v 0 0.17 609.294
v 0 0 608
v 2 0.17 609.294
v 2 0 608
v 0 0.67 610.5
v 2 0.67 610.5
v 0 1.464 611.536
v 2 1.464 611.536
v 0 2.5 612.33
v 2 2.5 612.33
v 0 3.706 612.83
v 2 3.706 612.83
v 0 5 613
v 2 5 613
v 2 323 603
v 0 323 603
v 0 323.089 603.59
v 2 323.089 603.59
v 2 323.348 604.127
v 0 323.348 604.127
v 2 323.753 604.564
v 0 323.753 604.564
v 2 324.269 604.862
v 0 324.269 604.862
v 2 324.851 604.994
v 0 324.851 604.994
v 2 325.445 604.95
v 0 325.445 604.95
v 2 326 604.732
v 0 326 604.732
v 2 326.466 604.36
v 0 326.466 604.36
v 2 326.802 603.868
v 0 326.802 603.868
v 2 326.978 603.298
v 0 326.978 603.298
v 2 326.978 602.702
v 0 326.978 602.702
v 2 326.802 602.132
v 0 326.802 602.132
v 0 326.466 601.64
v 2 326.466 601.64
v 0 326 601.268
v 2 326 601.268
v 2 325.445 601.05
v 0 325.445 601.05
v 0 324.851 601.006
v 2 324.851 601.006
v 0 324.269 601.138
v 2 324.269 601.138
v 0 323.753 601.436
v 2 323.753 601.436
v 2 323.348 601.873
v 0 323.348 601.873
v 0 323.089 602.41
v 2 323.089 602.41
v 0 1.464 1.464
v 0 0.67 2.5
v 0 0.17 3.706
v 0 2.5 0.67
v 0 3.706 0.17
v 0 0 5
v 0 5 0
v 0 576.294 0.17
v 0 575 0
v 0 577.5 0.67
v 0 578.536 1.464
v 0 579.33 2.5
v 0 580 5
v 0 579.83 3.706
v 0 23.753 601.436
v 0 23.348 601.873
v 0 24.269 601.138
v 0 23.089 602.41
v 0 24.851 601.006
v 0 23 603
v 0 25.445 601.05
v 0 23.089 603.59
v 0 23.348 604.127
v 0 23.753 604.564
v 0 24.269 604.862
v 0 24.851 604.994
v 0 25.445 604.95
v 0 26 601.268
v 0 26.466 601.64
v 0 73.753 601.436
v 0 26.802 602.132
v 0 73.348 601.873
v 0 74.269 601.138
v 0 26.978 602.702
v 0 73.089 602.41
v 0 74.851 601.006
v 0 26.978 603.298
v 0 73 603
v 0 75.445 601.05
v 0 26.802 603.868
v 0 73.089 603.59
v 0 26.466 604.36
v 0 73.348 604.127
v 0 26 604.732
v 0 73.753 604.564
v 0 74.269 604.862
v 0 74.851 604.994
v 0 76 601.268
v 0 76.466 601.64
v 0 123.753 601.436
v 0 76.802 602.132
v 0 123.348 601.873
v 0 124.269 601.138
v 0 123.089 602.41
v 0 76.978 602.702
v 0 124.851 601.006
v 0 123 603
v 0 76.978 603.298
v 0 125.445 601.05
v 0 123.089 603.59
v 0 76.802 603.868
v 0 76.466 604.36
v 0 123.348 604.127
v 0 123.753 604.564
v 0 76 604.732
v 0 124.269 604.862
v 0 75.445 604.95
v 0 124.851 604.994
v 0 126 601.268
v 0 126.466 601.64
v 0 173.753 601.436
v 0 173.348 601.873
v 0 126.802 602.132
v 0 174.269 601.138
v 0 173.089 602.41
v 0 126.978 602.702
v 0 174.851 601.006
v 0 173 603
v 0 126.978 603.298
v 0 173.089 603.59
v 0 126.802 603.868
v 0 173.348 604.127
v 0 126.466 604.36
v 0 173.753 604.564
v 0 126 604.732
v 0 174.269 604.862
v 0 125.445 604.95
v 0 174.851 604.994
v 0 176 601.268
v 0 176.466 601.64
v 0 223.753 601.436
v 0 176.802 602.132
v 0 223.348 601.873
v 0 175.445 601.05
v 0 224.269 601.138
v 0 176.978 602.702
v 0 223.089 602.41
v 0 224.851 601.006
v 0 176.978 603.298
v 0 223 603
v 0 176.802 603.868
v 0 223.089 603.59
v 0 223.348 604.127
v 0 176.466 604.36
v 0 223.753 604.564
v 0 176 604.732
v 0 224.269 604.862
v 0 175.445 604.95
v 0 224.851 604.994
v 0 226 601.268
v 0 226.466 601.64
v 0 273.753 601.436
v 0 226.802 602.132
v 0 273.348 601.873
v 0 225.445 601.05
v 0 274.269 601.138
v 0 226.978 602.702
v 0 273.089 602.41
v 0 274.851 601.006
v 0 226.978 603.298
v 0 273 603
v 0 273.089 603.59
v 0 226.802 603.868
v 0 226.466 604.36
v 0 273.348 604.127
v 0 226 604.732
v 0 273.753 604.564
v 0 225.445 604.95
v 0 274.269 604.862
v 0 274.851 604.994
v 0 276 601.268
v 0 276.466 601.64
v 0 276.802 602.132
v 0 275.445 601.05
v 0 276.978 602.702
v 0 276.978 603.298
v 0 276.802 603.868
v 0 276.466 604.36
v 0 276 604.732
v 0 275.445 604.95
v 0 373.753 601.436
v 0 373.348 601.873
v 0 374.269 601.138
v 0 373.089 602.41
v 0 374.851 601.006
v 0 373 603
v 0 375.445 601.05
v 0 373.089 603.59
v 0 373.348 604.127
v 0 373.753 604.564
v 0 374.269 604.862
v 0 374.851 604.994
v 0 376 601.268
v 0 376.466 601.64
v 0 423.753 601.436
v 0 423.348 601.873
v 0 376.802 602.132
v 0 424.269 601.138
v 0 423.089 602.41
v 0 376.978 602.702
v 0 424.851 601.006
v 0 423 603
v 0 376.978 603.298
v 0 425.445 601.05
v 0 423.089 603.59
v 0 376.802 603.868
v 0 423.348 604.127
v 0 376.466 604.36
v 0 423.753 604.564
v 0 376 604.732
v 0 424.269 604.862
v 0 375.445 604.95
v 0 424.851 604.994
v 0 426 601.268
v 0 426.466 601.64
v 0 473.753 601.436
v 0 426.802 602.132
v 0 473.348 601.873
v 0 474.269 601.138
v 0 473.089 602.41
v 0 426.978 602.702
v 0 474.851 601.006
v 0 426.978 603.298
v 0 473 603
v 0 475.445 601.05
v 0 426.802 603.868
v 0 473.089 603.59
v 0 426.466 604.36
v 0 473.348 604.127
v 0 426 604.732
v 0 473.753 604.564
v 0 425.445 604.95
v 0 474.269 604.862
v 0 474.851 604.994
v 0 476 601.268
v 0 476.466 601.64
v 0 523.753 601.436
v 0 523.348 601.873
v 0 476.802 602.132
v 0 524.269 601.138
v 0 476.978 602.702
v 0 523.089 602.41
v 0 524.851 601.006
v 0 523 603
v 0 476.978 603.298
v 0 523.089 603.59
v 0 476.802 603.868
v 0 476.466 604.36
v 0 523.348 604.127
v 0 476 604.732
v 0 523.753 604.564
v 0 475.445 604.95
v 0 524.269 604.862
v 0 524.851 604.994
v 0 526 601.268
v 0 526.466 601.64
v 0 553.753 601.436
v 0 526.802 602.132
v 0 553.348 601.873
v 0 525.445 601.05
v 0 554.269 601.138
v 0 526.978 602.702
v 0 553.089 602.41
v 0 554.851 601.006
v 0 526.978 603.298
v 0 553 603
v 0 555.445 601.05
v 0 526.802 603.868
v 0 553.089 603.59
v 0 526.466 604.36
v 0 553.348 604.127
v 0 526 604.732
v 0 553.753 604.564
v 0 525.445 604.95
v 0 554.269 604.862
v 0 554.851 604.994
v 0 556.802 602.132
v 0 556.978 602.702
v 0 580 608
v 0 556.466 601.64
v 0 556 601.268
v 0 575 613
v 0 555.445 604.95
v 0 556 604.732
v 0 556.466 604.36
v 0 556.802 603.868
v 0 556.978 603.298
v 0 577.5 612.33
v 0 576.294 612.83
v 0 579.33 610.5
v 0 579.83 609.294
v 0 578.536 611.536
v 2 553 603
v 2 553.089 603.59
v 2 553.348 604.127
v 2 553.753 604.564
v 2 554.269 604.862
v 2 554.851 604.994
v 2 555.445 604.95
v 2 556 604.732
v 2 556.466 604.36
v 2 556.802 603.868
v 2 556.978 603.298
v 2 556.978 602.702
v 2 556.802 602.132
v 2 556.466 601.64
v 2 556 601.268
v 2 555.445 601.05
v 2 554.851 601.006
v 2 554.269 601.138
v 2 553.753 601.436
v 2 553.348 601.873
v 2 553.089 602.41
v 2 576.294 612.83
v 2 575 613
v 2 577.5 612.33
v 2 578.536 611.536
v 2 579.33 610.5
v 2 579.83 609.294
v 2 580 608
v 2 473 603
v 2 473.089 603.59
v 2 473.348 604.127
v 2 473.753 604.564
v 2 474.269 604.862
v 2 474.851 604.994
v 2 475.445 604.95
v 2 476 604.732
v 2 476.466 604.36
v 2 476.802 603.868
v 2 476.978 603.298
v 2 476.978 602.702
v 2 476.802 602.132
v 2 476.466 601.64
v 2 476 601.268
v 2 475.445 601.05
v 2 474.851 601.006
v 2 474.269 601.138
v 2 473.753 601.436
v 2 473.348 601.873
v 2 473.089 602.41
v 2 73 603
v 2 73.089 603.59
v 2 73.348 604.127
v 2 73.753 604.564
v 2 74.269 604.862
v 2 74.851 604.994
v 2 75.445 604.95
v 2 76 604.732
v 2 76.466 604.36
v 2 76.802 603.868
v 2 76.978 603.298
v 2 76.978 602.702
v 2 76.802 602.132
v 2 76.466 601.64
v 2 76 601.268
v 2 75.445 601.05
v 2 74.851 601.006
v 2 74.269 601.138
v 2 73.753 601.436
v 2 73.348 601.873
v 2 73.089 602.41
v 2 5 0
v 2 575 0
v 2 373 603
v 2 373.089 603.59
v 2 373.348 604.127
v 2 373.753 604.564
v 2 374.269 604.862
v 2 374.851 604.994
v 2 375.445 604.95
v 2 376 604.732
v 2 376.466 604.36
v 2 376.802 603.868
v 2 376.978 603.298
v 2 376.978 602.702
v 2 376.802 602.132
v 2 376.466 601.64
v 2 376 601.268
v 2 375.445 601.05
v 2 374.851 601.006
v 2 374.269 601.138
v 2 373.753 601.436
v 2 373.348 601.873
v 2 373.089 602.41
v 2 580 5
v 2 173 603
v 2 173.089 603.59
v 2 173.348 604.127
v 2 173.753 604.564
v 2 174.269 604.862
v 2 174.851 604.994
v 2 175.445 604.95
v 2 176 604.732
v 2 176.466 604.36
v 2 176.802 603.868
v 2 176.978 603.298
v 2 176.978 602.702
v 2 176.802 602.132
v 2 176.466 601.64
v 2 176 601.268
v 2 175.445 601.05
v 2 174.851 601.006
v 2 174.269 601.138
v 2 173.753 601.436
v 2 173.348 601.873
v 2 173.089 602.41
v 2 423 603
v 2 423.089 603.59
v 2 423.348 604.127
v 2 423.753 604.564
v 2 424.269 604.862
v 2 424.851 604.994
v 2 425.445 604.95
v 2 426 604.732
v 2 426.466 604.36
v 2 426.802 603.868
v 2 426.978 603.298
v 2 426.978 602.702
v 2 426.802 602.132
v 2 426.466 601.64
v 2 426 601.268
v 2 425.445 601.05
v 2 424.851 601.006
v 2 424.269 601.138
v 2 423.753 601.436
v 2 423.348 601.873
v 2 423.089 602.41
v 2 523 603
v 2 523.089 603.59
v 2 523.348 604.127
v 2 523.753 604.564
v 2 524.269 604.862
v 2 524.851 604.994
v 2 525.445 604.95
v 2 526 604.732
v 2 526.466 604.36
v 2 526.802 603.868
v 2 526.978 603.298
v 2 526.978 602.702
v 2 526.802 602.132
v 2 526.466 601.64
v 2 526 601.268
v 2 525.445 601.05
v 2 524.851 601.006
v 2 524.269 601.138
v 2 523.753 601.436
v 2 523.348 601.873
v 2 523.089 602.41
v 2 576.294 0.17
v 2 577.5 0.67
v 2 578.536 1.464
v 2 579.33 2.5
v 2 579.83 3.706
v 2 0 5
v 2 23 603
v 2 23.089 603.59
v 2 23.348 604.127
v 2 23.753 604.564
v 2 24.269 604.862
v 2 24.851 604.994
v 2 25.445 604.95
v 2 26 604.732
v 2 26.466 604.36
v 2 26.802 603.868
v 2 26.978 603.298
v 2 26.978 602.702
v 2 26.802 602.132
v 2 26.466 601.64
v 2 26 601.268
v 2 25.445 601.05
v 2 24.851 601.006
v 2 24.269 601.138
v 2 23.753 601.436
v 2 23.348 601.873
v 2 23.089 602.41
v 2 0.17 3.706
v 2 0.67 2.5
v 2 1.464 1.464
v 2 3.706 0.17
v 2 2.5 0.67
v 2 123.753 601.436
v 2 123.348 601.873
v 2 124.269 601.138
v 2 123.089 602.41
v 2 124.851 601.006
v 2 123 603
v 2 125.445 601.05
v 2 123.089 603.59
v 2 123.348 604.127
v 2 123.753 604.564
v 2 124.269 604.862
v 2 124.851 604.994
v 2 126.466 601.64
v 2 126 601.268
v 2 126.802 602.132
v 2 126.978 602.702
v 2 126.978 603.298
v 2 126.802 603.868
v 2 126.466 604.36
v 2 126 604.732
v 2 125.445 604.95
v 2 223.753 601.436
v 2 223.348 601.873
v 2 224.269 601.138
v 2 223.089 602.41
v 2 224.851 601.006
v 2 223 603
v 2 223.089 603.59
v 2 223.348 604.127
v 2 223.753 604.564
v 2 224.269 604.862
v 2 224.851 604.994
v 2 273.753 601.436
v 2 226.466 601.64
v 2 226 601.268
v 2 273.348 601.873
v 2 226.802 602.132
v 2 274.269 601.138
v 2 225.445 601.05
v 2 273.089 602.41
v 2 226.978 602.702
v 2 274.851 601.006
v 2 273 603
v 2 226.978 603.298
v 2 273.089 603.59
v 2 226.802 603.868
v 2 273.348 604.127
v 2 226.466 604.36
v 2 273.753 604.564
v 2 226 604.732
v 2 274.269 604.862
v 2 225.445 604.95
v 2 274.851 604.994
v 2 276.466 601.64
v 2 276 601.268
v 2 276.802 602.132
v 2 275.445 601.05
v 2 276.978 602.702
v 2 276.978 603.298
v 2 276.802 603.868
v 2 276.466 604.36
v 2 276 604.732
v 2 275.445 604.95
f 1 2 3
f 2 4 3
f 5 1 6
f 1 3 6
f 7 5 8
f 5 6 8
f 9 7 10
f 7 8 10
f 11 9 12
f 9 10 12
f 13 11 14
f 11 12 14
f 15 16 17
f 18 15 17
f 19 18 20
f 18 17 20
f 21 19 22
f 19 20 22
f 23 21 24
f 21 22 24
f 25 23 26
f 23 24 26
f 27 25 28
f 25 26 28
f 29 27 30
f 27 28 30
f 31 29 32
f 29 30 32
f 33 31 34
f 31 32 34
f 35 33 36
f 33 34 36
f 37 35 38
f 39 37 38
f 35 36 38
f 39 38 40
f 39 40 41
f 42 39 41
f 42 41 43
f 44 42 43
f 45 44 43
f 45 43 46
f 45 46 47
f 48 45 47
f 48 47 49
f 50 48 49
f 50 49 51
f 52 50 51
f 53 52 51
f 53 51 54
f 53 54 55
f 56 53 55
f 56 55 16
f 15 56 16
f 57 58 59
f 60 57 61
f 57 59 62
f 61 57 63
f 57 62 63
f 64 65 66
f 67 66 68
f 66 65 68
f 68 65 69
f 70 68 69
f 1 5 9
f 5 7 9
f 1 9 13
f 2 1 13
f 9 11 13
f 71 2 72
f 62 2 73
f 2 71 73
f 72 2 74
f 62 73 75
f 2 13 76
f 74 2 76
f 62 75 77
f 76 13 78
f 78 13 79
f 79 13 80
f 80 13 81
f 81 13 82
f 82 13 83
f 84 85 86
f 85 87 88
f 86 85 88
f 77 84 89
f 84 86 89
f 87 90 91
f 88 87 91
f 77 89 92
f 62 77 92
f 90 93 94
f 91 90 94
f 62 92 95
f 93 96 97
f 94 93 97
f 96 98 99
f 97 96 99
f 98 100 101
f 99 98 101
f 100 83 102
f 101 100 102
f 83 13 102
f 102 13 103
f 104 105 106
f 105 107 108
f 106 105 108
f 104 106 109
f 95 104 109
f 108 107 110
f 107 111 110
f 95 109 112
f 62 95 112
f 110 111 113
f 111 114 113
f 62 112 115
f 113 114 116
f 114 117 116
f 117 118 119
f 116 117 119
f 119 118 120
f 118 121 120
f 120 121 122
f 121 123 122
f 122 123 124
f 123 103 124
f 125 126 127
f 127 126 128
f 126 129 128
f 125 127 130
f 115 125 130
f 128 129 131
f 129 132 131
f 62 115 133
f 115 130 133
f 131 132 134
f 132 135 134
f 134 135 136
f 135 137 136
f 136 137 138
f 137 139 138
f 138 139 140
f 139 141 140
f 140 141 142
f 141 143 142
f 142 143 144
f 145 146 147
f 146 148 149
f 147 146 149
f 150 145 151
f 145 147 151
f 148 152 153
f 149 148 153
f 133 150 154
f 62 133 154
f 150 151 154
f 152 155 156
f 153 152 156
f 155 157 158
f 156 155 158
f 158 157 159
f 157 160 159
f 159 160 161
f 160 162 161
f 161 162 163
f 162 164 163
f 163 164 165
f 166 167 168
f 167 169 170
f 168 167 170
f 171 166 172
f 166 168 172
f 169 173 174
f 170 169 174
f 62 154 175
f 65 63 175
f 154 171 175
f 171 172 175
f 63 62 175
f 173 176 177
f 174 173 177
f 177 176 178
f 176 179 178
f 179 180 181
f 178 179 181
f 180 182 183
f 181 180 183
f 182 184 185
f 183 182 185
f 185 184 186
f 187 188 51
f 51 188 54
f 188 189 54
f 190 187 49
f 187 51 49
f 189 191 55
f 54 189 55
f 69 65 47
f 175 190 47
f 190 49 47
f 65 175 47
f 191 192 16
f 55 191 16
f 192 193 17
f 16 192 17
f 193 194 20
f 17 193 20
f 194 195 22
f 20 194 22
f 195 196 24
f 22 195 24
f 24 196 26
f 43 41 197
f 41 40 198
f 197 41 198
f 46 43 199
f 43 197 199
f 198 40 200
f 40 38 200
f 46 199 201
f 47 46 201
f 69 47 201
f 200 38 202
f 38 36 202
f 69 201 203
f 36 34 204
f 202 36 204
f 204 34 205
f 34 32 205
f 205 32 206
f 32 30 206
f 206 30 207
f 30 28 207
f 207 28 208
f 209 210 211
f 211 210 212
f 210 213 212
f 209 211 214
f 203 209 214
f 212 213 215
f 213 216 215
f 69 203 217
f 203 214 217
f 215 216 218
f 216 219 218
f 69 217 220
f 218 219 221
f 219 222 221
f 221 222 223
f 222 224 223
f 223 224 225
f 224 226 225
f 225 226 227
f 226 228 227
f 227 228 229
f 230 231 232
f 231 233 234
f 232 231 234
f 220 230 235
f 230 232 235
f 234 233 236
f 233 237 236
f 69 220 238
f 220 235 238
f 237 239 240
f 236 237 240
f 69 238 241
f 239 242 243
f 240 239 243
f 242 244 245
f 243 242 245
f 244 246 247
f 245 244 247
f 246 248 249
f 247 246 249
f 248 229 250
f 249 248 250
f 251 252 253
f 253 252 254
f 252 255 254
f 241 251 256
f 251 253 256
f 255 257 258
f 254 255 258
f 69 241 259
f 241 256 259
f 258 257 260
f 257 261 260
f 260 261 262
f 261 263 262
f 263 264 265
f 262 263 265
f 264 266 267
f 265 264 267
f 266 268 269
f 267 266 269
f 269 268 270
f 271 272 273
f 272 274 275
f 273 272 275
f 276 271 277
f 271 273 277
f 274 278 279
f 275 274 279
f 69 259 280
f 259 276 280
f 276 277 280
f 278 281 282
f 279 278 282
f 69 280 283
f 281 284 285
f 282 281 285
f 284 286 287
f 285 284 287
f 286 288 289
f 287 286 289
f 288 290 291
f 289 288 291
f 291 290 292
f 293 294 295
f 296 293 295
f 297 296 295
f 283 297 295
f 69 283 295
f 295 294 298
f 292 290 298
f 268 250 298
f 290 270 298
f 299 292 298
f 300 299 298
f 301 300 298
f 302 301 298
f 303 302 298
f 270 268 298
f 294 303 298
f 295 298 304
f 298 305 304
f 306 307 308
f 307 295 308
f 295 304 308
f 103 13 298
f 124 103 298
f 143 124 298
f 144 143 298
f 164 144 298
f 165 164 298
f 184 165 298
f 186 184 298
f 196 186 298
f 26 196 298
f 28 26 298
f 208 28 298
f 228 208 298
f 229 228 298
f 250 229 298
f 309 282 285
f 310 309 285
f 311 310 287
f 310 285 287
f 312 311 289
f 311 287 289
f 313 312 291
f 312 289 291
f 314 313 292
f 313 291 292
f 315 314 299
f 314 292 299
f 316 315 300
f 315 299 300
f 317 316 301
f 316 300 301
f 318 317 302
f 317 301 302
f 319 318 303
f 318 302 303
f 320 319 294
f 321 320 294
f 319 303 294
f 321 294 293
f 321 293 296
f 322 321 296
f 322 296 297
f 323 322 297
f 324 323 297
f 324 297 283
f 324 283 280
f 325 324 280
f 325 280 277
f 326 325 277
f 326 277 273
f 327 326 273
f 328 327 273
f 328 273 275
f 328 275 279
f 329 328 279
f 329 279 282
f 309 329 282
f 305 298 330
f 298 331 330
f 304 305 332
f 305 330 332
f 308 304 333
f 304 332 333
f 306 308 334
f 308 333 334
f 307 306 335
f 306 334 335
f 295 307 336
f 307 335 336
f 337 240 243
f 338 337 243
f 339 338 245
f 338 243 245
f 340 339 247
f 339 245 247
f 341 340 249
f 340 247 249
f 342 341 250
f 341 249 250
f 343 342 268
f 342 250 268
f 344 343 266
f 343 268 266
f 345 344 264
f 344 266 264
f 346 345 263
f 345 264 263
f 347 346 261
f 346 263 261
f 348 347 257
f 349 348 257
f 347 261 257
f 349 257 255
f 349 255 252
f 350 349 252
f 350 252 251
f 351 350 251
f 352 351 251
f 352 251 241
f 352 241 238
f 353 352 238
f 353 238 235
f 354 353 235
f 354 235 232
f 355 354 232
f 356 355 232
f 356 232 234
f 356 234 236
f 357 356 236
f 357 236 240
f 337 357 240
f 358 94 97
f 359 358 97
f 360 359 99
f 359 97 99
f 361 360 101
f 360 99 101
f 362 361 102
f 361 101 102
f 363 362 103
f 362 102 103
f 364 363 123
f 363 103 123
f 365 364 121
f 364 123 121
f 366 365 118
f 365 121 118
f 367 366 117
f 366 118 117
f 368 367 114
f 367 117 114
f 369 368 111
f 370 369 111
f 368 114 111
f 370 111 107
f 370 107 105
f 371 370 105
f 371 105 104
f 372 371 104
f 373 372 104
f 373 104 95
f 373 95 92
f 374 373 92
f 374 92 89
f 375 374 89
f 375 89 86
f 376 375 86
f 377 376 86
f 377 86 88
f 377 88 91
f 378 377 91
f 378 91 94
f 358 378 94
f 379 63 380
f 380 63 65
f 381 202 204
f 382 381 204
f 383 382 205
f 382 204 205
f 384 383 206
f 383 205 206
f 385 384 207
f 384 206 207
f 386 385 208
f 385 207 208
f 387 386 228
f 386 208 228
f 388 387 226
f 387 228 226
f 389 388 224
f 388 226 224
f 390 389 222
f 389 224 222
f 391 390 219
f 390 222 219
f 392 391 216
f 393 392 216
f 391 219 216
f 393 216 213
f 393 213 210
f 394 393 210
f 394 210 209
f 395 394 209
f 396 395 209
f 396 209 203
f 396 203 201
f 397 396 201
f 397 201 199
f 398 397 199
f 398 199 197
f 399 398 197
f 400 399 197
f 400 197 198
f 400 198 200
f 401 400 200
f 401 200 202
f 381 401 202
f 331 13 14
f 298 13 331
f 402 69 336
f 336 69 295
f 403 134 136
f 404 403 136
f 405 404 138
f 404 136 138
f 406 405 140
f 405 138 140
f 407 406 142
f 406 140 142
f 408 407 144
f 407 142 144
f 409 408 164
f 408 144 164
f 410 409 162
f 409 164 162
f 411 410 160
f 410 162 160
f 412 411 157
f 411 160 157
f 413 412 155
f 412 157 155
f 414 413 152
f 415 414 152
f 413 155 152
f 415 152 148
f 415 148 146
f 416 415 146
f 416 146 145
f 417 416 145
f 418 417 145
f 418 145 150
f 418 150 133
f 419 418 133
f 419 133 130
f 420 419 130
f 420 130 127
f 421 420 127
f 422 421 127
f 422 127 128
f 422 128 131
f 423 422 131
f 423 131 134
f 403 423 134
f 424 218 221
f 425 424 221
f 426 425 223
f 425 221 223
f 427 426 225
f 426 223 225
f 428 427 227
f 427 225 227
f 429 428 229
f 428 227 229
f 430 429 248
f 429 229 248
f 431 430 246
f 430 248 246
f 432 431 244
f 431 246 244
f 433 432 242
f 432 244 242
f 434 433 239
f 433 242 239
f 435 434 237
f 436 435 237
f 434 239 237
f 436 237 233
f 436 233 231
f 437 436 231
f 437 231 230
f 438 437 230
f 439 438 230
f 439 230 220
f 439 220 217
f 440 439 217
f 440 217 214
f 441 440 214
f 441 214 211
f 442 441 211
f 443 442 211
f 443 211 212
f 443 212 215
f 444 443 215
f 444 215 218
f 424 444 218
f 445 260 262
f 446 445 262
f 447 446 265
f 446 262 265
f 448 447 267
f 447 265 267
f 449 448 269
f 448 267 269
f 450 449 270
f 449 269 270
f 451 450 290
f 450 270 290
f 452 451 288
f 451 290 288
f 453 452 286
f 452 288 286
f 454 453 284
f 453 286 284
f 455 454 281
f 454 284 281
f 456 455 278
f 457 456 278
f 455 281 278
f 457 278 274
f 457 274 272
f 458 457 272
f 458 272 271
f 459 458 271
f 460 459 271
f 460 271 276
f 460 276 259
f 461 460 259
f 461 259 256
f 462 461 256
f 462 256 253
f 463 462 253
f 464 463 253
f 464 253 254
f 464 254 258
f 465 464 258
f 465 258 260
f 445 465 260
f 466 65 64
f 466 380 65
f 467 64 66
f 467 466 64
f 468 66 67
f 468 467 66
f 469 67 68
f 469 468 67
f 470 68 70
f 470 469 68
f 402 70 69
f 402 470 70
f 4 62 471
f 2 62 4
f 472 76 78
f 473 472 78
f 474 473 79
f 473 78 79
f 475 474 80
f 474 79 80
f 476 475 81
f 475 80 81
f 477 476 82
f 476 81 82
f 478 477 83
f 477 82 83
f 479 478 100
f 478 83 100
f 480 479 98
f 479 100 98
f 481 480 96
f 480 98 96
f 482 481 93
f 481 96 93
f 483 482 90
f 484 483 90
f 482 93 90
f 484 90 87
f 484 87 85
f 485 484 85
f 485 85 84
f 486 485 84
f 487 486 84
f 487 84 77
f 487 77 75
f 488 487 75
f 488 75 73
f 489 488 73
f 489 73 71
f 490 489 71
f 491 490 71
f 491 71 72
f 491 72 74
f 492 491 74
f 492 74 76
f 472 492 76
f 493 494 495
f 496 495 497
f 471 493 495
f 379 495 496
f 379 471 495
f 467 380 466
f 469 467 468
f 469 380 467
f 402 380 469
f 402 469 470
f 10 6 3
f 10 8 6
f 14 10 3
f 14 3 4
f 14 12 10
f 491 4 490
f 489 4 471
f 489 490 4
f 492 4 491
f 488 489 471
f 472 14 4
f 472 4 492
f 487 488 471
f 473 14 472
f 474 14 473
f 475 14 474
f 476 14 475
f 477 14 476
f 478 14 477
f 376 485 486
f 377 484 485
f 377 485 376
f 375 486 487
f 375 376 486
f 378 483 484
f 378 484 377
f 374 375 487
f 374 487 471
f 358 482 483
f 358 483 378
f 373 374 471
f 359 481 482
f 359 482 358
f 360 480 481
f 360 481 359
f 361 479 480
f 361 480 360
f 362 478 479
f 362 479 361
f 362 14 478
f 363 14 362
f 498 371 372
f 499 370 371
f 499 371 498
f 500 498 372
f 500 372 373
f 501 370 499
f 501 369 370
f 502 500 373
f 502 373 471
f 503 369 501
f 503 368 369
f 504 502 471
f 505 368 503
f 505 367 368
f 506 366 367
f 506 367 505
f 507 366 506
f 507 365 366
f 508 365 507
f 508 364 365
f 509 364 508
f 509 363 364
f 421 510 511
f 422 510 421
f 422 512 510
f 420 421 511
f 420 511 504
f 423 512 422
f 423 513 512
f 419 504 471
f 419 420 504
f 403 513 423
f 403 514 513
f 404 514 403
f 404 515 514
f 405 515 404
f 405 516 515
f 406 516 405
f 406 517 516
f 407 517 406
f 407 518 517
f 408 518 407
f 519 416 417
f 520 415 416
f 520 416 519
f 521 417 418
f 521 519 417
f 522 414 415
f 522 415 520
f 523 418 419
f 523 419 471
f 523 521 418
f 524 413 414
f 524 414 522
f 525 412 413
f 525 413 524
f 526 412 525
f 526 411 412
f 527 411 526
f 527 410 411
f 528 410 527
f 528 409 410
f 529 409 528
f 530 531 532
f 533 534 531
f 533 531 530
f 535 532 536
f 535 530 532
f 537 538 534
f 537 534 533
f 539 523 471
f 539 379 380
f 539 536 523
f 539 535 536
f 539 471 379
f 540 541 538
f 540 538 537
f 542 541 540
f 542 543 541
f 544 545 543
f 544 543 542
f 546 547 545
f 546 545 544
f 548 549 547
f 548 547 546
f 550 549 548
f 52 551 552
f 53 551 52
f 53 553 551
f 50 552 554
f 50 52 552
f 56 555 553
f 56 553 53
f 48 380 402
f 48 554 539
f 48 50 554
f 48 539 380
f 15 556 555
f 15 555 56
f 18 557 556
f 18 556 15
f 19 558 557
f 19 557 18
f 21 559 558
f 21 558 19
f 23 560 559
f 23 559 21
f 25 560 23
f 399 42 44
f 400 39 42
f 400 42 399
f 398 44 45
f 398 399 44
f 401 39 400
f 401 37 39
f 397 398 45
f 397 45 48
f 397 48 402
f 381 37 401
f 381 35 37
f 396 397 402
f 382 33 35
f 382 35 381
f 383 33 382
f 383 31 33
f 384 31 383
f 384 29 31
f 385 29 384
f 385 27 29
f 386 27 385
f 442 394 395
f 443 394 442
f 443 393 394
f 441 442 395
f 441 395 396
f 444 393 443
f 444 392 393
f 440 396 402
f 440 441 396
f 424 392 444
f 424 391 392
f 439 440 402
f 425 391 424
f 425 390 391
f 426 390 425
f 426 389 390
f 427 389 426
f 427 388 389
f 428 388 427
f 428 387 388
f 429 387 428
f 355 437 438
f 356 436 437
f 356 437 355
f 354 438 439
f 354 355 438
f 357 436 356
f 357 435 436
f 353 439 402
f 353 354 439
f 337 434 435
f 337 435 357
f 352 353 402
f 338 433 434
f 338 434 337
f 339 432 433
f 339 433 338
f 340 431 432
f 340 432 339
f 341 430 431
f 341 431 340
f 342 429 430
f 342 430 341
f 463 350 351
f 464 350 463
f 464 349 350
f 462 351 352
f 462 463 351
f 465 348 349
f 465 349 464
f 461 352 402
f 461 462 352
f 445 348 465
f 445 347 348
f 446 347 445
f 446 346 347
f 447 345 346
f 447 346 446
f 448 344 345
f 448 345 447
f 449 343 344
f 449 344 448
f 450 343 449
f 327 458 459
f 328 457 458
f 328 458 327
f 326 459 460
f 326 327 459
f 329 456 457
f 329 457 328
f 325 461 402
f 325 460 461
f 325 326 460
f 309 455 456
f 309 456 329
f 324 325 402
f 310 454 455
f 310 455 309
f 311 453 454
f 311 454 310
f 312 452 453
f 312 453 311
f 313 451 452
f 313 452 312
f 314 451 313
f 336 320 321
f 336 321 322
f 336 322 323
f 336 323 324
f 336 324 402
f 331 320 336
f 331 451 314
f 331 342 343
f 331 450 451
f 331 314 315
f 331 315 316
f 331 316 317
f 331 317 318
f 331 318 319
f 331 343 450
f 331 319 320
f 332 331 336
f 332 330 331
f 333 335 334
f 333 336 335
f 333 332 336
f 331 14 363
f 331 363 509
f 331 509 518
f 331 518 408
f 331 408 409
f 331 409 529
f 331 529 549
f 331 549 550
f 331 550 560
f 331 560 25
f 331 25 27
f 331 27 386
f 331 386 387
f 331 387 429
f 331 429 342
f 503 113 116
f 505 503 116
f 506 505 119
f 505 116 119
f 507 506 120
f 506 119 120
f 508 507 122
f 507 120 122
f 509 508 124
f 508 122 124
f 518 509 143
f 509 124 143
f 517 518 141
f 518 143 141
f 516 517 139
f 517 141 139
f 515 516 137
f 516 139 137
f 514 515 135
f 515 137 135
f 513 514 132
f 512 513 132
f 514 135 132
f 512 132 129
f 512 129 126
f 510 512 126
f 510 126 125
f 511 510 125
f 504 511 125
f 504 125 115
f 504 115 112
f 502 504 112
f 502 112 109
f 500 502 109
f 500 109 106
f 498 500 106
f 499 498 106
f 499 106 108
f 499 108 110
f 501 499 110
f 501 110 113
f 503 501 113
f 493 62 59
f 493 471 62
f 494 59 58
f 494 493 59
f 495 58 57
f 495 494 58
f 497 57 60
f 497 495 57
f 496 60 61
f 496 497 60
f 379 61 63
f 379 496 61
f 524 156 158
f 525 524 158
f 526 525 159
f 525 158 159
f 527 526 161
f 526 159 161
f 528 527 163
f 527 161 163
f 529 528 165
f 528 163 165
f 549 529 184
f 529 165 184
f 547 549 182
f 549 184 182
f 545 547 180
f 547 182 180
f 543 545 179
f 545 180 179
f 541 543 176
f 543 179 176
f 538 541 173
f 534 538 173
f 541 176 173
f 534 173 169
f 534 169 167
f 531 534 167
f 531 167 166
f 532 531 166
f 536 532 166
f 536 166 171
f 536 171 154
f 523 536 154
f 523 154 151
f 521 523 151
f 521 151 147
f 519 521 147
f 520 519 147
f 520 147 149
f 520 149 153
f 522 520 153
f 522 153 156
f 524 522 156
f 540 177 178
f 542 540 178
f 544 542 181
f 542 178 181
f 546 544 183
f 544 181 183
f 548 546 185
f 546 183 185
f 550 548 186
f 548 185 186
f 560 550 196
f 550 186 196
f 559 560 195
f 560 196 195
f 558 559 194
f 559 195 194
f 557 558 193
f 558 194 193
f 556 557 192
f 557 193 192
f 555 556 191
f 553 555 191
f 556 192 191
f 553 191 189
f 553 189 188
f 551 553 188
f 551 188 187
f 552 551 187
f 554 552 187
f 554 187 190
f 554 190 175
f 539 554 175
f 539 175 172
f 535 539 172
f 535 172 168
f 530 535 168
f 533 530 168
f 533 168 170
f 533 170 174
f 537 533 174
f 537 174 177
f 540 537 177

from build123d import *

# Parameters (mm, degrees)
F0_W     = 580
F0_H     = 613
F1_DEPTH = 2
F3_D     = 4
F4_R     = 5


with BuildPart() as f1:
    # F0 (on Right) → F1 (new body)
    with BuildSketch(Plane.YZ):
        with Locations((290, 306.5)):
            Rectangle(F0_W, F0_H)
    extrude(amount=F1_DEPTH)

    # F3 (through all)
    with Locations(Plane.YZ.offset(2)):
        with Locations((25, 603), (75, 603), (125, 603), (175, 603), (225, 603), (325, 603), (275, 603), (375, 603), (425, 603), (475, 603), (525, 603), (555, 603)):
            Hole(F3_D / 2)

    # F4
    f4_edges = [f1.edges().sort_by_distance(p)[0] for p in [
        (1, 0, 613),
        (1, 580, 613),
        (1, 0, 0),
        (1, 580, 0),
    ]]
    fillet(f4_edges, radius=F4_R)


solid = f1.part
